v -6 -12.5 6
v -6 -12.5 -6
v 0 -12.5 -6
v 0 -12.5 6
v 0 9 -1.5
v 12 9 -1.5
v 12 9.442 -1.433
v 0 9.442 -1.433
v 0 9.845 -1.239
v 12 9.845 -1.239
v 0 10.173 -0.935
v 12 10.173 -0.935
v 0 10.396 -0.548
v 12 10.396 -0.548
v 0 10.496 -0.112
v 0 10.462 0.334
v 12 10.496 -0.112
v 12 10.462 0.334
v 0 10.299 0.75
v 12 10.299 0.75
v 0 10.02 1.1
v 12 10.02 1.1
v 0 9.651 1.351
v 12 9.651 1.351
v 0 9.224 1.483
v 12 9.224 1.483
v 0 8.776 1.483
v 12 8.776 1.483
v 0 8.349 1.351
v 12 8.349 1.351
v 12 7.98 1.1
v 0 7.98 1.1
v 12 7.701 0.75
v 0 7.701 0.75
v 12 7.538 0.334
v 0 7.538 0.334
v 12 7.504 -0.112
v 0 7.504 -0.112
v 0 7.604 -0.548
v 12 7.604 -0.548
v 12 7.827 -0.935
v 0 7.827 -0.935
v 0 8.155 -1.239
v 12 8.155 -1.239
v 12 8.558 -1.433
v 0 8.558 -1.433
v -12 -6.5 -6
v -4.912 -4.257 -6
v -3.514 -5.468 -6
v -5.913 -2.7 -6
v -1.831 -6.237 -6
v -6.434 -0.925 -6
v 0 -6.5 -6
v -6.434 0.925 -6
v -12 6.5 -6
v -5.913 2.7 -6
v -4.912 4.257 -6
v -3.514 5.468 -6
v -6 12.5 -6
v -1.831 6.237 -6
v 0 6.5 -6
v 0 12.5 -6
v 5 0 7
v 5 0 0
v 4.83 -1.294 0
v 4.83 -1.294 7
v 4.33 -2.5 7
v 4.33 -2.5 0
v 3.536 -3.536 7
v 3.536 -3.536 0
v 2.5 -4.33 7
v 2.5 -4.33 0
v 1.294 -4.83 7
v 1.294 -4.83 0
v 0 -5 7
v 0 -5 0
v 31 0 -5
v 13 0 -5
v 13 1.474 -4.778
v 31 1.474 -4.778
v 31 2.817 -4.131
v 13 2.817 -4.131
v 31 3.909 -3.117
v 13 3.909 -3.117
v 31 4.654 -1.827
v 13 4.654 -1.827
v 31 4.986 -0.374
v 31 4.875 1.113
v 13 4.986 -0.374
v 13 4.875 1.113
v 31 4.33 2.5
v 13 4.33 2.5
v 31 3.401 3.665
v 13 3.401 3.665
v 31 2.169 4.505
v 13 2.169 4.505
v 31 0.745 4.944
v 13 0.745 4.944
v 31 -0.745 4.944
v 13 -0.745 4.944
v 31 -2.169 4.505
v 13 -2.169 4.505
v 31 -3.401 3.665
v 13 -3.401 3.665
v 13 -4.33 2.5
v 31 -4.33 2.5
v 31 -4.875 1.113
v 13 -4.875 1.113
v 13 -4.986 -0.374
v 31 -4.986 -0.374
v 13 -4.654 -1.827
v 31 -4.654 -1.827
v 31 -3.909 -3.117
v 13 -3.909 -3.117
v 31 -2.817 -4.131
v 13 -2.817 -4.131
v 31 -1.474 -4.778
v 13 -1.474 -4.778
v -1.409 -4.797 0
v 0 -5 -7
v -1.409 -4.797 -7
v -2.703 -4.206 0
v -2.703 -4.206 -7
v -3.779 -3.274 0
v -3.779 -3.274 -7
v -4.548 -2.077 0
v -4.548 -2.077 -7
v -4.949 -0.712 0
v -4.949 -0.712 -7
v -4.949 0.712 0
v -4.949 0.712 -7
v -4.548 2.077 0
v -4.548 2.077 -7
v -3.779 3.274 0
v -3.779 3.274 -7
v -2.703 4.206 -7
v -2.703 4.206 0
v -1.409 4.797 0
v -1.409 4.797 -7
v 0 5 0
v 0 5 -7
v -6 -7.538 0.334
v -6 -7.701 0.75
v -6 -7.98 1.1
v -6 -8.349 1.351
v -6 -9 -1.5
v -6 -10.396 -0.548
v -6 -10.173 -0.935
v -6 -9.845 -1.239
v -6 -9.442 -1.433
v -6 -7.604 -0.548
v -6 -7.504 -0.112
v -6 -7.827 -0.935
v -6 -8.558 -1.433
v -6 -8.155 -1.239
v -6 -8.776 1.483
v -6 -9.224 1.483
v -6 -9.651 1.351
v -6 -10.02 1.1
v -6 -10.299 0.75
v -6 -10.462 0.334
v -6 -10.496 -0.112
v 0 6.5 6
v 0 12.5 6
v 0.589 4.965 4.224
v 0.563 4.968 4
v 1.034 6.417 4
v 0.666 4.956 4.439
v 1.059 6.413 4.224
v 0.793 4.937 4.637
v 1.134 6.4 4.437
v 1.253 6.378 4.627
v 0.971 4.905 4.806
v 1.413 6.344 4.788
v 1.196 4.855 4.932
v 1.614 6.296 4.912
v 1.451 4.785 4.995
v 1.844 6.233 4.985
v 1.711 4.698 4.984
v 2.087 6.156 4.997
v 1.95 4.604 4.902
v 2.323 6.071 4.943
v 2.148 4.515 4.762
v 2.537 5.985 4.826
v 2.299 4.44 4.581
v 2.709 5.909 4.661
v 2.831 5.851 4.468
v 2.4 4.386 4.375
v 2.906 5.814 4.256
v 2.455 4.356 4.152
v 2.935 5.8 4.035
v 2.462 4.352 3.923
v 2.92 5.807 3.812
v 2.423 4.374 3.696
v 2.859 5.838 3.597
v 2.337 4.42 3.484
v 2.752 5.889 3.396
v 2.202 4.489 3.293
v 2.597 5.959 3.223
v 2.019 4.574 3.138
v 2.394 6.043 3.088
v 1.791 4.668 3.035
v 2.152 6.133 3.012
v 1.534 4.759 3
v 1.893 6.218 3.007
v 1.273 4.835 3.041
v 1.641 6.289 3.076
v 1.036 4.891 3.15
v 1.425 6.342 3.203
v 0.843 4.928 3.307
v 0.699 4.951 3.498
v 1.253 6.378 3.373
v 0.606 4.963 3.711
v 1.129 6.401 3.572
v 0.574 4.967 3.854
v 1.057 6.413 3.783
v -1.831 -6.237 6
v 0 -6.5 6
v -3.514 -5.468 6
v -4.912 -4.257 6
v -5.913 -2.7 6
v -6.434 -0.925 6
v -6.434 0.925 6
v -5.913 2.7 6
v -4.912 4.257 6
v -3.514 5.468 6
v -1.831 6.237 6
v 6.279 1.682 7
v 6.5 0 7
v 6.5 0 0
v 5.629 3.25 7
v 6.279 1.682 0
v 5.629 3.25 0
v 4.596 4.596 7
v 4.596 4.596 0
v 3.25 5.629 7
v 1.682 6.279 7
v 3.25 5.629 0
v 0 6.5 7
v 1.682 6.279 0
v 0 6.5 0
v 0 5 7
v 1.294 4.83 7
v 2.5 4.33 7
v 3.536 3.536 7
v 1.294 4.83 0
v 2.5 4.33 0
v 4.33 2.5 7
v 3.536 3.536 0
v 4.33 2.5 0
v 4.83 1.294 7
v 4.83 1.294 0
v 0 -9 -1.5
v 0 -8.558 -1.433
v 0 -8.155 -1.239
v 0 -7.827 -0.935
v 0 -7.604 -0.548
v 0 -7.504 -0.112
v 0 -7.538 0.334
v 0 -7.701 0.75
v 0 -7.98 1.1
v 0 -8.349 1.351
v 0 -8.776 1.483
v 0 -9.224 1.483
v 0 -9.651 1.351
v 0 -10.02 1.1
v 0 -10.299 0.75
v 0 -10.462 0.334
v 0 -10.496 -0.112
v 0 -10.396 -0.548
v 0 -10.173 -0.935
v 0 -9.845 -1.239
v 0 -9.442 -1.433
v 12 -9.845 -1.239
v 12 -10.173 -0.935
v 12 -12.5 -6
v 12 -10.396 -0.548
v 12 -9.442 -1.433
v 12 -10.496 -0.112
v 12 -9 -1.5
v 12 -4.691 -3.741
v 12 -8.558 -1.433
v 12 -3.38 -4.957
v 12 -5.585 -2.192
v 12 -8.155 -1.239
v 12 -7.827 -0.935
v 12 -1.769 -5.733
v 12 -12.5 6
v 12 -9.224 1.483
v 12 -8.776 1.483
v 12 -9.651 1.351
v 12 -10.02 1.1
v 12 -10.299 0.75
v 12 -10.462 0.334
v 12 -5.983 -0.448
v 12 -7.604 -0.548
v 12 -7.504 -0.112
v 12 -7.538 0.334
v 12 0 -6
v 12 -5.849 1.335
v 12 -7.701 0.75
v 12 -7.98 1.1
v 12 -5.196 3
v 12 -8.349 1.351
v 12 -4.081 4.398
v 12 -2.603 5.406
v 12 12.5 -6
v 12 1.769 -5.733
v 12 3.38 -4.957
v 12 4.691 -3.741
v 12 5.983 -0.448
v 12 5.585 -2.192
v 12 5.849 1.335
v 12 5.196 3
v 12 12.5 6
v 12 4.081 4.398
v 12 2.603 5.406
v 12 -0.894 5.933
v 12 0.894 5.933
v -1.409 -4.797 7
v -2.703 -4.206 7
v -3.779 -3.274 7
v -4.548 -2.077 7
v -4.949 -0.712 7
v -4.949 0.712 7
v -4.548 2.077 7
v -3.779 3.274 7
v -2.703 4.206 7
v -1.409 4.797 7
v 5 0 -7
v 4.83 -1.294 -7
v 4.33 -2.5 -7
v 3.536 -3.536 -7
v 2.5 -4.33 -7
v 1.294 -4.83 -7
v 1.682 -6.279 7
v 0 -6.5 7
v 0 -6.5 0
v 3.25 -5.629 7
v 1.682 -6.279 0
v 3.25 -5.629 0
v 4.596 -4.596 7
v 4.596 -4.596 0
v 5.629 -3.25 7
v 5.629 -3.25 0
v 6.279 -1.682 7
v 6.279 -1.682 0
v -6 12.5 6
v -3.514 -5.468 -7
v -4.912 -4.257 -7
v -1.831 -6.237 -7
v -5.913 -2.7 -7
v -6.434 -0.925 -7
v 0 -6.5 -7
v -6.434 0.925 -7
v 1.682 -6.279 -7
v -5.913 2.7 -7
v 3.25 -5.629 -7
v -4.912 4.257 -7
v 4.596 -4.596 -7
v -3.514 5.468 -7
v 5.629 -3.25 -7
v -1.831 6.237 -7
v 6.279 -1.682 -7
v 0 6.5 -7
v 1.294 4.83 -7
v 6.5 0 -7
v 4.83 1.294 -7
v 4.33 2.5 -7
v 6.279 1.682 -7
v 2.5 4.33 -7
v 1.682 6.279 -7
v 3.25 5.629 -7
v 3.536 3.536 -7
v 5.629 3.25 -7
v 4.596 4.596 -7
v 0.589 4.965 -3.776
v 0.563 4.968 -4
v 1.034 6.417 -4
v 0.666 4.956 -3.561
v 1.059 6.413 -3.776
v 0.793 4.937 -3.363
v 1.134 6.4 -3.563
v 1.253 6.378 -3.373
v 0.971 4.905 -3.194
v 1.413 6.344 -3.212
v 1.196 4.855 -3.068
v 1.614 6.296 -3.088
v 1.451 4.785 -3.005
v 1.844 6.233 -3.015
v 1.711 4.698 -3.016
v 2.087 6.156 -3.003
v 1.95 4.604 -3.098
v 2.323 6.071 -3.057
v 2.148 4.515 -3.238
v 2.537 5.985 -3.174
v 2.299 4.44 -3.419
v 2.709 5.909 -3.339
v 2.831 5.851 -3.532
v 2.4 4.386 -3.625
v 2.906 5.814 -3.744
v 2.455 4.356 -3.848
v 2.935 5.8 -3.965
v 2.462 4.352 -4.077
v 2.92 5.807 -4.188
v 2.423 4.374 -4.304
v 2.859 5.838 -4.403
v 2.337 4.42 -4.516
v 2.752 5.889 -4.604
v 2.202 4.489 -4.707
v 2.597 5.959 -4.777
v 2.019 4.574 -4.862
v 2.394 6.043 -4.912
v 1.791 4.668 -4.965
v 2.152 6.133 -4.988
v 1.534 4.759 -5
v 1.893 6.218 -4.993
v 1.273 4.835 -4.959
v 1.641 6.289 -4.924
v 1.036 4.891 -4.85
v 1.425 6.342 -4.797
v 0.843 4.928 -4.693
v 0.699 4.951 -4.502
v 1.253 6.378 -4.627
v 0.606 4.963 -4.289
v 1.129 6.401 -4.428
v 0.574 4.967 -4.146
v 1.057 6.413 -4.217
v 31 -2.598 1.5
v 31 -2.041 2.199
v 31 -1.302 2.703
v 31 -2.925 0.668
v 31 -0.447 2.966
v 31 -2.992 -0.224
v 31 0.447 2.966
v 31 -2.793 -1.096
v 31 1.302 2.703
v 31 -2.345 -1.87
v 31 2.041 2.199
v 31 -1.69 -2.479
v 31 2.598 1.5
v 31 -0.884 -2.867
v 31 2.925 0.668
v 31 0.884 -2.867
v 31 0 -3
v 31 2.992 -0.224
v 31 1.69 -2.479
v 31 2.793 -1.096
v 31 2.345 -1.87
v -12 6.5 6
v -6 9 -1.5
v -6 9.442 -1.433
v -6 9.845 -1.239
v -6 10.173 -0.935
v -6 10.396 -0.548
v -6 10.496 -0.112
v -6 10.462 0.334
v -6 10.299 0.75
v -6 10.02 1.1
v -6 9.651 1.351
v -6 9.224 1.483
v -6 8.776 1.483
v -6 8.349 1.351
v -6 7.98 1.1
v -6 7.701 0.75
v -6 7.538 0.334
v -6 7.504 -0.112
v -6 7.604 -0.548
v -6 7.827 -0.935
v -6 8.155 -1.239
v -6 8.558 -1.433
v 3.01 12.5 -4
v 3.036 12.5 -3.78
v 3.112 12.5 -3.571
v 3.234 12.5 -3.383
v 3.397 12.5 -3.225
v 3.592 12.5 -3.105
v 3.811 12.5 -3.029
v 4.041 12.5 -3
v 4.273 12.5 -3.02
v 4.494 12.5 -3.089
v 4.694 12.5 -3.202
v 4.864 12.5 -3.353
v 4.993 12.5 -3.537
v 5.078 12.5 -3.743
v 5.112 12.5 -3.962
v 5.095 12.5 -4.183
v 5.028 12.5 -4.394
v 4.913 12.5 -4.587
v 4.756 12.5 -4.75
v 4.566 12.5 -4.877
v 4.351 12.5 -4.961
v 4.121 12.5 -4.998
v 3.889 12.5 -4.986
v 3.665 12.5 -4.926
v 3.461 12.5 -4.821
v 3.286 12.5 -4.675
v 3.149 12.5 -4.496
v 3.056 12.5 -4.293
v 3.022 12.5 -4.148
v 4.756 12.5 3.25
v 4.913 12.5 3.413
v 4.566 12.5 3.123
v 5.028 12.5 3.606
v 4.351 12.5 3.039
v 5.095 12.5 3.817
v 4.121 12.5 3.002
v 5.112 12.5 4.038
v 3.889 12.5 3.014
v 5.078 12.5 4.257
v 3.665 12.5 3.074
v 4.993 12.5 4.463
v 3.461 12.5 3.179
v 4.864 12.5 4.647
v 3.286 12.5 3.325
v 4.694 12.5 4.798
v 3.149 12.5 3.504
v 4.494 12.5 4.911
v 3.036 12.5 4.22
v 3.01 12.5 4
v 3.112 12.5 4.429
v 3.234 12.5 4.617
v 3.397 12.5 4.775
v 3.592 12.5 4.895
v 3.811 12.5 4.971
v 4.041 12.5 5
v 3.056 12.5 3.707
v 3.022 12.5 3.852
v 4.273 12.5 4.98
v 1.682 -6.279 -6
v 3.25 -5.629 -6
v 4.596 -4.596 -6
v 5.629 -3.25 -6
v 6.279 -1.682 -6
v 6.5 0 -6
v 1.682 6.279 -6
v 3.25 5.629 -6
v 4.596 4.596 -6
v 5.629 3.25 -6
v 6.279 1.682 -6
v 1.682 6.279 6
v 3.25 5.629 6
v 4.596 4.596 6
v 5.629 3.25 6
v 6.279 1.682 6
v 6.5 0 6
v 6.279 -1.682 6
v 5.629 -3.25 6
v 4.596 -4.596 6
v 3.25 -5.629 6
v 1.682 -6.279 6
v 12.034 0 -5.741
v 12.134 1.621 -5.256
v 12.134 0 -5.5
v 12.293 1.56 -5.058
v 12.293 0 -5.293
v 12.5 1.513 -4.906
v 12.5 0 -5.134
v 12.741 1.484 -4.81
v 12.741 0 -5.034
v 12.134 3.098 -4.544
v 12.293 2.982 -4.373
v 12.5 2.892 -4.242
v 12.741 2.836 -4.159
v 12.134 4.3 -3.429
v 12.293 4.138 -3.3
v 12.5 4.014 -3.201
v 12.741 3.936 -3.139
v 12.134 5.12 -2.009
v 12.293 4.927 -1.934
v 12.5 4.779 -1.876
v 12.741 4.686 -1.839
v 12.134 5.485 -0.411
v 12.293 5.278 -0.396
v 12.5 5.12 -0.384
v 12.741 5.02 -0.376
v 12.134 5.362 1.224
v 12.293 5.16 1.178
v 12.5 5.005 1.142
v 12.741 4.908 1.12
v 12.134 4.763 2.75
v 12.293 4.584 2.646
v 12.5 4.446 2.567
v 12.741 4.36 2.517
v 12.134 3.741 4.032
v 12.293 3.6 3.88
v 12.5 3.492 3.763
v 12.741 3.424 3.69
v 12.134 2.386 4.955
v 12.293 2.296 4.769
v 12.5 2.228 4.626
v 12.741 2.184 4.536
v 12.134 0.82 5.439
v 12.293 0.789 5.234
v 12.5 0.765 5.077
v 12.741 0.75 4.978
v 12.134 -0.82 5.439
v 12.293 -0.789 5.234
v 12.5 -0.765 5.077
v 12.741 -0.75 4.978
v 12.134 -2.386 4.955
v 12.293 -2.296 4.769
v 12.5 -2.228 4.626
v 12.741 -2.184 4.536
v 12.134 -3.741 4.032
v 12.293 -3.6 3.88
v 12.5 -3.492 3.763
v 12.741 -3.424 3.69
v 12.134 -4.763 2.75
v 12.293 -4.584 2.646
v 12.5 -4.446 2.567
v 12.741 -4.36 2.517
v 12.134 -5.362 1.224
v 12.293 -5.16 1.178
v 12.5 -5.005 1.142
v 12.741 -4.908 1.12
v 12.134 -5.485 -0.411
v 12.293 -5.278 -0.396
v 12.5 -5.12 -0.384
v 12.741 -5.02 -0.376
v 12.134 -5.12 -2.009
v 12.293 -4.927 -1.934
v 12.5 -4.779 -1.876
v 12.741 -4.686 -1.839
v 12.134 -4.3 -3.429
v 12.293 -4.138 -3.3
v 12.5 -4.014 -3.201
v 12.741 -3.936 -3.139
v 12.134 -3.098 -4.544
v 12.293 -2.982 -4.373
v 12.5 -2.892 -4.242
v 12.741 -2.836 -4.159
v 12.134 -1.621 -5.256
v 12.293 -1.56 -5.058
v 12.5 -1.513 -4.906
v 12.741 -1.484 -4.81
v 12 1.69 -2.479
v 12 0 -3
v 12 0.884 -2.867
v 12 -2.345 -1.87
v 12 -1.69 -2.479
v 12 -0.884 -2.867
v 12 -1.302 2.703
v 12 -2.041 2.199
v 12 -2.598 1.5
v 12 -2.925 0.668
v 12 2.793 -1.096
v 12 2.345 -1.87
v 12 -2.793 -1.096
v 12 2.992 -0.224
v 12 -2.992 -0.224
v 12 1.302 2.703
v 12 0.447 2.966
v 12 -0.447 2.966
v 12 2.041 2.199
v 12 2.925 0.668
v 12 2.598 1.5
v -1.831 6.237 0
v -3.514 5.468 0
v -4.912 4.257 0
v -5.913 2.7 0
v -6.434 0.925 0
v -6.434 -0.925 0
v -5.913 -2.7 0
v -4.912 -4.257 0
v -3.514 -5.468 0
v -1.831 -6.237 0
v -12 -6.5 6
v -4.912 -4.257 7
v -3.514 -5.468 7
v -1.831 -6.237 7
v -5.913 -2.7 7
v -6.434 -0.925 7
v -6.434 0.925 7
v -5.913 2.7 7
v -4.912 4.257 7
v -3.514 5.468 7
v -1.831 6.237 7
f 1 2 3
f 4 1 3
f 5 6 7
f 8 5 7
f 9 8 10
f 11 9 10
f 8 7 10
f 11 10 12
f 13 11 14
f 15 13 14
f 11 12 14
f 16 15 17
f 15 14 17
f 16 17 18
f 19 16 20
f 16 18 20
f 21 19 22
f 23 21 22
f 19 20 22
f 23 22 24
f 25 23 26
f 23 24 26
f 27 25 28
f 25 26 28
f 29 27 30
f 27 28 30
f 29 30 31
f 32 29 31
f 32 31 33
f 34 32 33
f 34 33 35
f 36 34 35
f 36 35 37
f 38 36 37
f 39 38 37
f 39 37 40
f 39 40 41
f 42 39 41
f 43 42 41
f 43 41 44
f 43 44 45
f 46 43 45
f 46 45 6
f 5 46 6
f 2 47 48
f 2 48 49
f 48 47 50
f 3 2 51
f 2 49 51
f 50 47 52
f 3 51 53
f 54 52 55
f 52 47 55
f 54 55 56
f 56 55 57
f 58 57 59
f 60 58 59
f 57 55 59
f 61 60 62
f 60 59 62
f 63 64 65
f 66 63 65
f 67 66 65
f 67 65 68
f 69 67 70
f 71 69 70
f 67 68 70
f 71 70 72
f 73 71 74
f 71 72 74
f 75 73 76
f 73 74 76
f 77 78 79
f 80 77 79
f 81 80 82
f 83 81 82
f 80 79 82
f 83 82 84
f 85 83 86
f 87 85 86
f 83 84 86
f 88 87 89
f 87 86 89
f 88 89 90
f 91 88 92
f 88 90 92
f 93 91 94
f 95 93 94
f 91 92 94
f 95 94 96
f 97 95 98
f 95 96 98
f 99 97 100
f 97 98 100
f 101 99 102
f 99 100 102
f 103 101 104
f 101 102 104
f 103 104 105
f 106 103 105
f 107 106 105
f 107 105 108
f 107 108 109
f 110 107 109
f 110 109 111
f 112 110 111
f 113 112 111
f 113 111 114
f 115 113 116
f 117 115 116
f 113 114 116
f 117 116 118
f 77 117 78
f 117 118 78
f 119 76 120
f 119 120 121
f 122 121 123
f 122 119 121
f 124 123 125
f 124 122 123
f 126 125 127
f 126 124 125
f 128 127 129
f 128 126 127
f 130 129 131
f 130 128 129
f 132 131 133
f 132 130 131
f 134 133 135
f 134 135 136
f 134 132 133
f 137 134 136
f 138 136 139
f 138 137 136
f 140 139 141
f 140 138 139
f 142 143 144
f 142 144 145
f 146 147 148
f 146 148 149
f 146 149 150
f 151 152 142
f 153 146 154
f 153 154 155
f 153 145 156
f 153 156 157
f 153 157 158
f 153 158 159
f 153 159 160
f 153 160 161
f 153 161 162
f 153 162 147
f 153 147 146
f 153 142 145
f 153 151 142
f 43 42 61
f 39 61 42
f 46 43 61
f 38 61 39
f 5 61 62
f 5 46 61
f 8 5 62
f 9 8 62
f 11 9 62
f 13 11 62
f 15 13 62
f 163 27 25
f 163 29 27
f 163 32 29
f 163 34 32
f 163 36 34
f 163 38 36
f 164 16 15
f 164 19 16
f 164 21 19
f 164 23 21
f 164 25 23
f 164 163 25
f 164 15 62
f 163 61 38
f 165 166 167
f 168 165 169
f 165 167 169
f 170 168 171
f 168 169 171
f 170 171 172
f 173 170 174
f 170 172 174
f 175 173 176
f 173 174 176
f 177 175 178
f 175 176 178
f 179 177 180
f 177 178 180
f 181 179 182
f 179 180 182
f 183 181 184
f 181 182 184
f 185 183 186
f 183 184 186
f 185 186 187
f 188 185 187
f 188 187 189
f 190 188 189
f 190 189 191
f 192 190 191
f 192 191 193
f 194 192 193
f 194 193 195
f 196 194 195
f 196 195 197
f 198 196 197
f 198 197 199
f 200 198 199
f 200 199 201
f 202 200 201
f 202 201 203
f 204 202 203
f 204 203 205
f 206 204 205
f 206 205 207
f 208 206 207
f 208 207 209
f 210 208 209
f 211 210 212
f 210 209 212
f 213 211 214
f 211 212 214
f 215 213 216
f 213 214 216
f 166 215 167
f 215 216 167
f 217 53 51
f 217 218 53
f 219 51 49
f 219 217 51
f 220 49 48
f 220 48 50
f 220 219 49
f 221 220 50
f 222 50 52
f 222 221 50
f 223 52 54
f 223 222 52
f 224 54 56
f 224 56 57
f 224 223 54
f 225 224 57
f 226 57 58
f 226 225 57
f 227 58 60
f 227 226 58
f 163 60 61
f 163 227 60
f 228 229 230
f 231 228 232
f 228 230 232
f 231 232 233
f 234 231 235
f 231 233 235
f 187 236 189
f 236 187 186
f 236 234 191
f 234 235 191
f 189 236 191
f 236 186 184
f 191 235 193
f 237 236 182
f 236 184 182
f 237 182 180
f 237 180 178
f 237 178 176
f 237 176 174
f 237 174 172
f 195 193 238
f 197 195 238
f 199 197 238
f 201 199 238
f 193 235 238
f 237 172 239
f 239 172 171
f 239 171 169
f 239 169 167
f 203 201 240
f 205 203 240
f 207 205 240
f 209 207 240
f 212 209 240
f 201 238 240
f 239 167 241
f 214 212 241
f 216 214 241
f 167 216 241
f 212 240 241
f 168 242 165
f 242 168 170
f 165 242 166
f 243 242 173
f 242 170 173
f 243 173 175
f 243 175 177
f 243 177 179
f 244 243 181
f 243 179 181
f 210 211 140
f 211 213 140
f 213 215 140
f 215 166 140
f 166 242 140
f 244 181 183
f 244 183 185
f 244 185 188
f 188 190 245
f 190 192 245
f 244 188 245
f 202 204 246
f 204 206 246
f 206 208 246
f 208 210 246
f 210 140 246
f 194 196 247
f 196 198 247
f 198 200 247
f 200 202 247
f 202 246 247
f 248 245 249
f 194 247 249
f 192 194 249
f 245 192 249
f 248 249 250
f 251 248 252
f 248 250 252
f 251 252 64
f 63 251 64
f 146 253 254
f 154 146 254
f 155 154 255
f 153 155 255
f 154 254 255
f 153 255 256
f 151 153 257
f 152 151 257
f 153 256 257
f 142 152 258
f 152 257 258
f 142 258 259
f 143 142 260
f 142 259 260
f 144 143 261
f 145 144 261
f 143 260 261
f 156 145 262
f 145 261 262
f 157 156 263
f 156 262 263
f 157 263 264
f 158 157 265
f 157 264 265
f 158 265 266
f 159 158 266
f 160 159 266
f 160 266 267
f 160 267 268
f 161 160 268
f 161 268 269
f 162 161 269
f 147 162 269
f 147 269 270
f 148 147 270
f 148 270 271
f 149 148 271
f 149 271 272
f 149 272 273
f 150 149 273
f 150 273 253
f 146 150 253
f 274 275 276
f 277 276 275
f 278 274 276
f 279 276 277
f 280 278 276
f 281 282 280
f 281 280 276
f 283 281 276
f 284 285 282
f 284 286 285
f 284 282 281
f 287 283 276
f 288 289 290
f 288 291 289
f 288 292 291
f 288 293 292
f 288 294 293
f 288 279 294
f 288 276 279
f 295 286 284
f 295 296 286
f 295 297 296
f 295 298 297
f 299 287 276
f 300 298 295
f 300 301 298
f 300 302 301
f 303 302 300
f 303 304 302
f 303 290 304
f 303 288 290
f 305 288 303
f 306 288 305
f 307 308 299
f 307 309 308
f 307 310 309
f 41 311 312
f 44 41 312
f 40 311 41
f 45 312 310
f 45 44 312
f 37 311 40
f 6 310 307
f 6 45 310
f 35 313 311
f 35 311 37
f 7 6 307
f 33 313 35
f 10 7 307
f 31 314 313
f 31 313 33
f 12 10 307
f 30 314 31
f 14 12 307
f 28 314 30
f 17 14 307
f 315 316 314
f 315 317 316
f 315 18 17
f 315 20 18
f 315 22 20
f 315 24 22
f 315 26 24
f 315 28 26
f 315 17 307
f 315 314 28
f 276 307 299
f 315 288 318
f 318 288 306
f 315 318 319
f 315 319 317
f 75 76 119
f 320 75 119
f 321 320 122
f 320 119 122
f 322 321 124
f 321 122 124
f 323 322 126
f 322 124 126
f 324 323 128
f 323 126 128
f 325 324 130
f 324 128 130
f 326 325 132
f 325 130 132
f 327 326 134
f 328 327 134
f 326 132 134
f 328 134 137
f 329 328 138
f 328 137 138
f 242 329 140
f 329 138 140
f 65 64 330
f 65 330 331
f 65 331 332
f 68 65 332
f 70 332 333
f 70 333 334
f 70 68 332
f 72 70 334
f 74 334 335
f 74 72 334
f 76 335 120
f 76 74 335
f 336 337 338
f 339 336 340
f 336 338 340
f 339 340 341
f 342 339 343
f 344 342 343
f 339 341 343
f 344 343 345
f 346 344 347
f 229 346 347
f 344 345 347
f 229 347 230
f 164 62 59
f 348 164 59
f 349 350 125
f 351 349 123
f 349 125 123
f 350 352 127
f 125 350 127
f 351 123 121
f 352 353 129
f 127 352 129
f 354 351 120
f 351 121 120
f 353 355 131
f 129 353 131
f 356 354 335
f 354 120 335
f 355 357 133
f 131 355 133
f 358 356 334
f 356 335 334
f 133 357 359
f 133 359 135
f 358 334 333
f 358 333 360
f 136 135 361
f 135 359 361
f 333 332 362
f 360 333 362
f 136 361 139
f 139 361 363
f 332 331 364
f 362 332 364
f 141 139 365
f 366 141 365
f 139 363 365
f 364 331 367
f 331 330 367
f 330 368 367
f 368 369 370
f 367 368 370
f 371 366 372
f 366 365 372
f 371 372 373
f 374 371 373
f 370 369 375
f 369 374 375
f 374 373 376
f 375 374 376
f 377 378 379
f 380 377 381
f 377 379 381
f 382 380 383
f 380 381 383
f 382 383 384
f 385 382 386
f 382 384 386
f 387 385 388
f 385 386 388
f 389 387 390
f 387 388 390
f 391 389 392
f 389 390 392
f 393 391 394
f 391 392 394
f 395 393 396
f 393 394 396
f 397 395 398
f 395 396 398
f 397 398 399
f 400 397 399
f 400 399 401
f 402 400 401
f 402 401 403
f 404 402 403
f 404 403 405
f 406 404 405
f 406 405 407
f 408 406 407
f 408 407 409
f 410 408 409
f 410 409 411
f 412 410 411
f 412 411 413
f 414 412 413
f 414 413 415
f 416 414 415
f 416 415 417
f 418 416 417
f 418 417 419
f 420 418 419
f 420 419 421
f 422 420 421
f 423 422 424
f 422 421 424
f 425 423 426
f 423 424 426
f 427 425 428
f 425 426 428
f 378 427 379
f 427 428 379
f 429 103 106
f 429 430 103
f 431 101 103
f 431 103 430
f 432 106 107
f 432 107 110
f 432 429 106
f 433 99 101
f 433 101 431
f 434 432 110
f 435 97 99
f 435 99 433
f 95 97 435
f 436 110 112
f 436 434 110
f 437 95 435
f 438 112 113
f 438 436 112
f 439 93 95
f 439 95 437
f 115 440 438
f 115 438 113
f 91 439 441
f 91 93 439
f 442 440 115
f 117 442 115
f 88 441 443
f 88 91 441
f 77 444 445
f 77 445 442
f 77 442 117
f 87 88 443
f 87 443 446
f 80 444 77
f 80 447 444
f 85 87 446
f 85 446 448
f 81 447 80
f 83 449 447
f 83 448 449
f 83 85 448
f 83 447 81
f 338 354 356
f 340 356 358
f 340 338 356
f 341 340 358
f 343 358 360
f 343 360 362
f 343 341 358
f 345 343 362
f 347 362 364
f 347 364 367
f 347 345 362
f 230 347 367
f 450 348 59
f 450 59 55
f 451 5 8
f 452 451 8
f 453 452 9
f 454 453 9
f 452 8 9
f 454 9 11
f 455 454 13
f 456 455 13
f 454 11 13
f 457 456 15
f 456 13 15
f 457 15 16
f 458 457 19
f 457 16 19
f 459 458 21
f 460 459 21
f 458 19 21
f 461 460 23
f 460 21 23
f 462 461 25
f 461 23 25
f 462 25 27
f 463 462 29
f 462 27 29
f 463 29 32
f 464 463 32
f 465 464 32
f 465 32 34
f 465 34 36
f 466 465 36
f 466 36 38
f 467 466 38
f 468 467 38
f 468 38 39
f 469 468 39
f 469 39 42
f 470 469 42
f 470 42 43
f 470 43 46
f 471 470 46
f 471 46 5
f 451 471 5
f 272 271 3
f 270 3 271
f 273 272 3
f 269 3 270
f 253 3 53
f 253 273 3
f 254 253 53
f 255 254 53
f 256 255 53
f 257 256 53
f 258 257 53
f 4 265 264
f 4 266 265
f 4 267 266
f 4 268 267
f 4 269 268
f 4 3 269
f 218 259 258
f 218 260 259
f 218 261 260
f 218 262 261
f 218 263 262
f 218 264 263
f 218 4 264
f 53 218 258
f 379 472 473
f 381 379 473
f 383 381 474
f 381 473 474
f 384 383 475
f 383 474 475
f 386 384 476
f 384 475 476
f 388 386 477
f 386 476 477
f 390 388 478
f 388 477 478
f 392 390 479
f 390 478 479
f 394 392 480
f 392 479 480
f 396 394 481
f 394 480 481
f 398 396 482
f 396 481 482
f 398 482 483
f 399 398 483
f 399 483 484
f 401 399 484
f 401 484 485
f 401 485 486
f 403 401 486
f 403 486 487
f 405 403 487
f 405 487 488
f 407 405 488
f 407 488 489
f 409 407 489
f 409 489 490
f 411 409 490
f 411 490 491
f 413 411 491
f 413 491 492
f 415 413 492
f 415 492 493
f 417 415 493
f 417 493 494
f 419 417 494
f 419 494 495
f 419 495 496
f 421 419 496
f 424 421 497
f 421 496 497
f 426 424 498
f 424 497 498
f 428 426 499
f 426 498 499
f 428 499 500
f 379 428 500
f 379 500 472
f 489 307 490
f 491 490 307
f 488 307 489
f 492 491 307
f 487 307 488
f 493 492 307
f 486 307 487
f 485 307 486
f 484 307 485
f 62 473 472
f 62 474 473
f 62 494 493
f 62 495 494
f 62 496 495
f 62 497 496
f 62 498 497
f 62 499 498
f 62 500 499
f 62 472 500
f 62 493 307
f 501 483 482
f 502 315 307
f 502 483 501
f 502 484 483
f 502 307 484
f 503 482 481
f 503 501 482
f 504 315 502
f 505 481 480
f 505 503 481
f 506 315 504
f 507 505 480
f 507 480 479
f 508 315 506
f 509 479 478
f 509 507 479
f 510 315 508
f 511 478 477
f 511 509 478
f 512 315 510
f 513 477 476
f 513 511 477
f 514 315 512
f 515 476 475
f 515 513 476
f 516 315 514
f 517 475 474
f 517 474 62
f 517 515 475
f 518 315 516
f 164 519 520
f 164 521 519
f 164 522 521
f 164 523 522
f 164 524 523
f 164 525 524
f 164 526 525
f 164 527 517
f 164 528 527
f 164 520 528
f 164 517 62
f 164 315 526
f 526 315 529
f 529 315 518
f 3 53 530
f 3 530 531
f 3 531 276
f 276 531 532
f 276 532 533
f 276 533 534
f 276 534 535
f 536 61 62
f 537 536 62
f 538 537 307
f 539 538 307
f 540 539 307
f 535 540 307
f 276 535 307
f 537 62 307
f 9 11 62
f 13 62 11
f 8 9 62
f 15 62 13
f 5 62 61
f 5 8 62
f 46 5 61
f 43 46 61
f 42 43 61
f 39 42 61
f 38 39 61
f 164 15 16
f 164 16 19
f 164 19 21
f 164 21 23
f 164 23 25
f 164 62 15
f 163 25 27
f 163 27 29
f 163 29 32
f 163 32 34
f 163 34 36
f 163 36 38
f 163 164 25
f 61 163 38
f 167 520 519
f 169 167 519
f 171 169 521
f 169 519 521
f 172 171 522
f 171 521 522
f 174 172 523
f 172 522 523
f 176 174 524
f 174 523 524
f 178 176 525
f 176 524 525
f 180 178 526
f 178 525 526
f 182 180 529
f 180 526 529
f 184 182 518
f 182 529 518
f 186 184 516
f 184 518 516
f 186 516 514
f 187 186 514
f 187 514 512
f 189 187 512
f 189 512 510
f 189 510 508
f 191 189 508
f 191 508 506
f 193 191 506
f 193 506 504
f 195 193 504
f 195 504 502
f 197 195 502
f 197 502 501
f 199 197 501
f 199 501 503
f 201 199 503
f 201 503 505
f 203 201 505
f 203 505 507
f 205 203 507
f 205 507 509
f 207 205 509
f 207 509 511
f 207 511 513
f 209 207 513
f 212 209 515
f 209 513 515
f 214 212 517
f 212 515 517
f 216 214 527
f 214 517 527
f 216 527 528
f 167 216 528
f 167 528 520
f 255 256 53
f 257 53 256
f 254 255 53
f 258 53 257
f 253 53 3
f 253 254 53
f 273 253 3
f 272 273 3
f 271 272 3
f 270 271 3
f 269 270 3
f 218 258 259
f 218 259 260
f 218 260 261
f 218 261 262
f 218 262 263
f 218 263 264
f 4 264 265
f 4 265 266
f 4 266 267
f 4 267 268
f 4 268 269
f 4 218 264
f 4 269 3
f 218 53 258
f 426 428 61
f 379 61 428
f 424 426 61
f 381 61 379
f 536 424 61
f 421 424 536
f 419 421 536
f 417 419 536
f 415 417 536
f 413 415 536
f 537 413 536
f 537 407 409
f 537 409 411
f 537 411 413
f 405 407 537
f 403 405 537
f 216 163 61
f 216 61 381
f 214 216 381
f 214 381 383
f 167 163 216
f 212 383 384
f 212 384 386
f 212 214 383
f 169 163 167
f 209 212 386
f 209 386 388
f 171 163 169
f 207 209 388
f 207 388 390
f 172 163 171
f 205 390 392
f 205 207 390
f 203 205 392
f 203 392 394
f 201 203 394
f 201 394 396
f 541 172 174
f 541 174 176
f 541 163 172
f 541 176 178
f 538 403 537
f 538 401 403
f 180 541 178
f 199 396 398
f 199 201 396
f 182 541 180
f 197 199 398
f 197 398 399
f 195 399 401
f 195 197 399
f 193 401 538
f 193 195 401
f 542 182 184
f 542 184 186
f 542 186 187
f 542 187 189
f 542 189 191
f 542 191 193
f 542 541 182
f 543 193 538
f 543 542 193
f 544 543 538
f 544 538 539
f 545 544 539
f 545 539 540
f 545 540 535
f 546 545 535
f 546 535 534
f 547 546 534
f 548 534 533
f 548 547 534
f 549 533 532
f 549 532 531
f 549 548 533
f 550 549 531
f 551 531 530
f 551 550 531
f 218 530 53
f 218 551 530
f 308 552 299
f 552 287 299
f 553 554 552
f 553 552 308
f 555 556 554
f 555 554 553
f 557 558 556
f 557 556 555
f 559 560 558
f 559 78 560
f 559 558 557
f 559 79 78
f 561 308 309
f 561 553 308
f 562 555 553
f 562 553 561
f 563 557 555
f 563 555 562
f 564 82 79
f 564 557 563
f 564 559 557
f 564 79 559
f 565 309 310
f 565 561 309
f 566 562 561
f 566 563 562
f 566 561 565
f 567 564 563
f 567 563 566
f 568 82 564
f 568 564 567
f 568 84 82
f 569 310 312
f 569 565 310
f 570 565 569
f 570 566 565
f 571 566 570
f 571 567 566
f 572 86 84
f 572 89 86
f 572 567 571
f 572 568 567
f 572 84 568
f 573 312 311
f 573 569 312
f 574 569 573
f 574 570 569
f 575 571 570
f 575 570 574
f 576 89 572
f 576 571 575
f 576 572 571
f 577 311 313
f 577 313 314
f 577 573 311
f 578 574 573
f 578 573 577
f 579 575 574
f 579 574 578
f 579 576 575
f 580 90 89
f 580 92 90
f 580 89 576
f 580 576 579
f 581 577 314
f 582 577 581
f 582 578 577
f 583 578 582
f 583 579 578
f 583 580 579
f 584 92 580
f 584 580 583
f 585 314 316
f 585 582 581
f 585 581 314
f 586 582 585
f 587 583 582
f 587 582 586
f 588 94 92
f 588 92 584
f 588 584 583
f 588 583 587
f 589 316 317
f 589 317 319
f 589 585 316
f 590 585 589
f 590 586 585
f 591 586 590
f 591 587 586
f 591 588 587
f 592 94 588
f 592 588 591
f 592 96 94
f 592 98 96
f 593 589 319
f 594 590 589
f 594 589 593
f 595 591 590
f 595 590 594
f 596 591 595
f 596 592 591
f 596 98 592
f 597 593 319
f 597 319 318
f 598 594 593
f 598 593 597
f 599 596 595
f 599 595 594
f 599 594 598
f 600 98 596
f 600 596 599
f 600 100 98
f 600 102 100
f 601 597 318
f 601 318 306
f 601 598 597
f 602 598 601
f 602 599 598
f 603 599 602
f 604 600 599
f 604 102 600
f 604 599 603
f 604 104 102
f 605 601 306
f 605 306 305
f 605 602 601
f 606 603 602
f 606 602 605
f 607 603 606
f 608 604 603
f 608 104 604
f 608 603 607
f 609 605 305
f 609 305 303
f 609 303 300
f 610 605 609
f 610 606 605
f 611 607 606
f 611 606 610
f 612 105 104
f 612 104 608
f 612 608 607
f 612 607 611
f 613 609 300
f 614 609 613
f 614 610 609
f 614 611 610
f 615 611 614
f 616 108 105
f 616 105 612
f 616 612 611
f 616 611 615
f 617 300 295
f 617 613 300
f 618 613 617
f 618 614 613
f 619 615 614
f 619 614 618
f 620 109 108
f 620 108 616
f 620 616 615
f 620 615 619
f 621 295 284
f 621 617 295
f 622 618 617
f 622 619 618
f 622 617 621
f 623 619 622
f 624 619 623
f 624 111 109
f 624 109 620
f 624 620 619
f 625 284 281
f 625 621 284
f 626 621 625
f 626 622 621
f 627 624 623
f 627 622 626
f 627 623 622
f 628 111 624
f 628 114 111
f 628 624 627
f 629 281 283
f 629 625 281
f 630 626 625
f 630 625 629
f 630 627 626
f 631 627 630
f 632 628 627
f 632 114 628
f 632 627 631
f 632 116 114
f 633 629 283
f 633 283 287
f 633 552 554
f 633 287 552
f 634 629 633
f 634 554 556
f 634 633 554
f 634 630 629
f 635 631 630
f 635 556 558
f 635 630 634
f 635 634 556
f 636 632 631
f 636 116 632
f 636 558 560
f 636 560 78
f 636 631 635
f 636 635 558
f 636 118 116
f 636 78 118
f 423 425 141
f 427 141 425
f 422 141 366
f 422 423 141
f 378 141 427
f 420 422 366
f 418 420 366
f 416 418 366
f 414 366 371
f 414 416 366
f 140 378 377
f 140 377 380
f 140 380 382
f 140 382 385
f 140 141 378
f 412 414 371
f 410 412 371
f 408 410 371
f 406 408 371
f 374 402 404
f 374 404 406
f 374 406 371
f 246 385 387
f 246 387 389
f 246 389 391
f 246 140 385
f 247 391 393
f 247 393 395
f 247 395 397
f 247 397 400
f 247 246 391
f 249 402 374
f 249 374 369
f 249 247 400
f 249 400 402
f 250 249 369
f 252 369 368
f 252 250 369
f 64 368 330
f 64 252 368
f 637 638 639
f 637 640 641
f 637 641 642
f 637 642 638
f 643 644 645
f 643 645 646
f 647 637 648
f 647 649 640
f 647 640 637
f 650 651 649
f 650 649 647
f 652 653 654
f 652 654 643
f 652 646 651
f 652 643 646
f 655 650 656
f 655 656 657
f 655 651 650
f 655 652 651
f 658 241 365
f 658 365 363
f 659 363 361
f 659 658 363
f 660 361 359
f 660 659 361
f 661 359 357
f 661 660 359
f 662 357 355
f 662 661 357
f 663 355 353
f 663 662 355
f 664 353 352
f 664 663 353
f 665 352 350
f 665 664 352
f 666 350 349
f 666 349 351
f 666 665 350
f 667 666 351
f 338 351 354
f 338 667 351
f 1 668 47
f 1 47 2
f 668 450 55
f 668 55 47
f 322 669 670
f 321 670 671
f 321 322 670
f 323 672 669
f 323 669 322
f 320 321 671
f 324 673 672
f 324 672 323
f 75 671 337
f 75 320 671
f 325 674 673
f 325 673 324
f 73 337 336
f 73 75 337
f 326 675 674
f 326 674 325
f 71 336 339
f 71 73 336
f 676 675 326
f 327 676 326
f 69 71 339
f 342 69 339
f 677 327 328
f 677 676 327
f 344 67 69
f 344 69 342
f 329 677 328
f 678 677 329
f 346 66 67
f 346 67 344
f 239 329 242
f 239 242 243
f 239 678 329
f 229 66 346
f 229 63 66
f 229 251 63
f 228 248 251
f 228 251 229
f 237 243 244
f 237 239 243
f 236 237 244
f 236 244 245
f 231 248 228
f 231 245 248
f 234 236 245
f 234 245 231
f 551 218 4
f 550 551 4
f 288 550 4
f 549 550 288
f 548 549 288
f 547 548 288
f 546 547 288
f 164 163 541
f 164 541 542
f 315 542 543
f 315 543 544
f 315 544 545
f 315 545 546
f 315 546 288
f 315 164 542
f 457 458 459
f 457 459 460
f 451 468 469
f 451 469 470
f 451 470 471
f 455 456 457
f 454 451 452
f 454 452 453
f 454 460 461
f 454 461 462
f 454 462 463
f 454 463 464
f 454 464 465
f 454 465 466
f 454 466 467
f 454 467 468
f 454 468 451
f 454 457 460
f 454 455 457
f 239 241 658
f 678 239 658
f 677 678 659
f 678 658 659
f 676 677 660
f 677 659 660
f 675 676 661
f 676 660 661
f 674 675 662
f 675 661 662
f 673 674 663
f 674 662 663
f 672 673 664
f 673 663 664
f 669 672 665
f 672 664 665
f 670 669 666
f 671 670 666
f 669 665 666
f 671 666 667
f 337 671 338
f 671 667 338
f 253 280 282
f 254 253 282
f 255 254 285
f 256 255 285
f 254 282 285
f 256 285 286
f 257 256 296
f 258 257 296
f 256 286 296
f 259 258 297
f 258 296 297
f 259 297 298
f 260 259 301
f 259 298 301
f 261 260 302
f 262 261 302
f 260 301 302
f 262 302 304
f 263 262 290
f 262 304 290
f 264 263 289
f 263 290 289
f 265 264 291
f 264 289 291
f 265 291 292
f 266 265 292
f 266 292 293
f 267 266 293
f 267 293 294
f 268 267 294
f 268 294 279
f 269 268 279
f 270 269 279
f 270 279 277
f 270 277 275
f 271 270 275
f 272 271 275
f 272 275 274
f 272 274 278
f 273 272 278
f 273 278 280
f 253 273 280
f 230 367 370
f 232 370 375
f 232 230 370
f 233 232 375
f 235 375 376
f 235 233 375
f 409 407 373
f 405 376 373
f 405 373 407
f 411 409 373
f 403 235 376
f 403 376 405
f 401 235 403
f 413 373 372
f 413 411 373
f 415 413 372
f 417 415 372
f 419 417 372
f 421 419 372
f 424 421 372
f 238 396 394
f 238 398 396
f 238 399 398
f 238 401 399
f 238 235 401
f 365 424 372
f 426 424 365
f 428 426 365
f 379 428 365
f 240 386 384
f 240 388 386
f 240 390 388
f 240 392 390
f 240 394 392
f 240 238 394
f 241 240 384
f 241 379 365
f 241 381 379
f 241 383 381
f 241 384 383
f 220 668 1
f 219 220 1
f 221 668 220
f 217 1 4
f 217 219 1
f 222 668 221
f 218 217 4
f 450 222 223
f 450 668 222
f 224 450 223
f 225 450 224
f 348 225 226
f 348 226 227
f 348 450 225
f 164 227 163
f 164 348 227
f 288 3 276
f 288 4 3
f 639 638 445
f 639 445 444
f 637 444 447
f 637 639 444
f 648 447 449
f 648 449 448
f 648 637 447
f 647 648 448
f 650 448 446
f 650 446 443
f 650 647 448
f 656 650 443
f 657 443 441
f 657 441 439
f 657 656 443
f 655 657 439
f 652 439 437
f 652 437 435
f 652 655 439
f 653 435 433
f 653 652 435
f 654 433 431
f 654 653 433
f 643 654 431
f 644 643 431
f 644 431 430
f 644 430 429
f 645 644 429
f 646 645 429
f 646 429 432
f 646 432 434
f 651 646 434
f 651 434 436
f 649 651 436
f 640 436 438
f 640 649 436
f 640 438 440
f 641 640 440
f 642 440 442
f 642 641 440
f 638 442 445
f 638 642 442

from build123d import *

# Parameters (mm, degrees)
BOSS_EXTRUDE1_DEPTH     = 6
BOSS_EXTRUDE2_DEPTH     = 6
SKETCH2_R               = 5
SKETCH2_R_2             = 3
BOSS_EXTRUDE3_DEPTH     = 19
SKETCH2_3_R             = 1.5
CUT_EXTRUDE1_DEPTH      = 18
BOSS_EXTRUDE4_DEPTH     = 7
CUT_EXTRUDE2_REACH      = 40.49
CUT_EXTRUDE2_END_RADIUS = 5
SKETCH3_R               = 1
FILLET1_R               = 1


with BuildPart() as part:
    # Sketch1 → Boss-Extrude1 (new, symmetric)
    with BuildSketch(Plane.XY):
        with BuildLine():
            Line((12, 12.5), (0, 12.5))
            Line((0, 12.5), (0, 6.5))
            ThreePointArc((0, 6.5), (4.596194078, 4.596194078), (6.5, 0))
            ThreePointArc((6.5, 0), (4.596194078, -4.596194078), (0, -6.5))
            Line((0, -6.5), (0, -12.5))
            Line((0, -12.5), (12, -12.5))
            Line((12, -12.5), (12, 12.5))
        make_face()
    extrude(amount=BOSS_EXTRUDE1_DEPTH, both=True)

    # Sketch2 → Boss-Extrude3 (add)
    with BuildSketch(Plane(origin=(12, 0, 0), x_dir=(0, 0, -1), z_dir=(1, 0, 0))):
        Circle(SKETCH2_R)
        Circle(SKETCH2_R_2, mode=Mode.SUBTRACT)
    extrude(amount=BOSS_EXTRUDE3_DEPTH)


with BuildPart() as body_2:
    # Sketch1<3> → Boss-Extrude2 (new, symmetric)
    with BuildSketch(Plane.XY):
        with BuildLine():
            Line((0, 6.5), (0, 12.5))
            Line((0, 12.5), (-6, 12.5))
            Line((-6, 12.5), (-12, 6.5))
            Line((-12, 6.5), (-12, -6.5))
            Line((-12, -6.5), (-6, -12.5))
            Line((-6, -12.5), (0, -12.5))
            Line((0, -12.5), (0, -6.5))
            ThreePointArc((0, -6.5), (-6.5, 0), (0, 6.5))
        make_face()
    extrude(amount=BOSS_EXTRUDE2_DEPTH, both=True)


with BuildPart() as cut_extrude1_tool:
    # Sketch2<3> → Cut-Extrude1 (new body)
    with BuildSketch(Plane(origin=(12, 0, 0), x_dir=(0, 0, -1), z_dir=(1, 0, 0))):
        with Locations((0, 9)):
            Circle(SKETCH2_3_R)
        with Locations((0, -9)):
            Circle(SKETCH2_3_R)
    extrude(amount=-CUT_EXTRUDE1_DEPTH)


with BuildPart() as part_1:
    add(part.part)

    # Cut-Extrude1: cut by cut_extrude1_tool
    add(cut_extrude1_tool.part, mode=Mode.SUBTRACT)


with BuildPart() as body_2_1:
    add(body_2.part)

    # Cut-Extrude1: cut by cut_extrude1_tool
    add(cut_extrude1_tool.part, mode=Mode.SUBTRACT)


with BuildPart() as body_3:
    # Sketch1<4> → Boss-Extrude4 (new, symmetric)
    with BuildSketch(Plane.XY):
        with BuildLine():
            ThreePointArc((6.5, 0), (4.596194078, 4.596194078), (0, 6.5))
            Line((0, 6.5), (0, 5))
            ThreePointArc((0, 5), (3.535533906, 3.535533906), (5, 0))
            ThreePointArc((5, 0), (3.535533906, -3.535533906), (0, -5))
            Line((0, -5), (0, -6.5))
            ThreePointArc((0, -6.5), (4.596194078, -4.596194078), (6.5, 0))
        make_face()
        with BuildLine():
            Line((0, 5), (0, 6.5))
            ThreePointArc((0, 6.5), (-6.5, 0), (0, -6.5))
            Line((0, -6.5), (0, -5))
            ThreePointArc((0, -5), (-5, 0), (0, 5))
        make_face()
    extrude(amount=BOSS_EXTRUDE4_DEPTH, both=True)


with BuildPart() as cut_extrude2_tool:
    # Cut-Extrude2: up to this cylinder (the profile starts outside it)
    cut_extrude2_end = Plane(origin=(0, 0, 0), z_dir=(0, 0, -1)) * Cylinder(CUT_EXTRUDE2_END_RADIUS, 99.98, mode=Mode.PRIVATE)
    # Sketch3 → Cut-Extrude2 (new, up to the surface)
    with BuildSketch(Plane(origin=(4.819555861, 14.833067729, 0), x_dir=(0, 0, -1), z_dir=(0.3090169943749482, 0.9510565162951534, 0)), mode=Mode.PRIVATE) as cut_extrude2_sk1:
        with Locations(Location((-4, 0, 0), (0, 0, 90))):
            Circle(SKETCH3_R)
    cut_extrude2_tool1 = extrude(cut_extrude2_sk1.sketch, amount=-CUT_EXTRUDE2_REACH, mode=Mode.PRIVATE) - cut_extrude2_end
    add(cut_extrude2_tool1.solids().sort_by_distance((4.819556, 14.833068, 4))[0])
    # Sketch3 → Cut-Extrude2 (new, up to the surface)
    with BuildSketch(Plane(origin=(4.819555861, 14.833067729, 0), x_dir=(0, 0, -1), z_dir=(0.3090169943749482, 0.9510565162951534, 0)), mode=Mode.PRIVATE) as cut_extrude2_sk2:
        with Locations(Location((4, 0, 0), (0, 0, 90))):
            Circle(SKETCH3_R)
    cut_extrude2_tool2 = extrude(cut_extrude2_sk2.sketch, amount=-CUT_EXTRUDE2_REACH, mode=Mode.PRIVATE) - cut_extrude2_end
    add(cut_extrude2_tool2.solids().sort_by_distance((4.819556, 14.833068, -4))[0])


with BuildPart() as part_2:
    add(part_1.part)

    # Cut-Extrude2: cut by cut_extrude2_tool
    add(cut_extrude2_tool.part, mode=Mode.SUBTRACT)

    # Fillet1
    fillet1_edges = [part_2.edges().sort_by_distance(p)[0] for p in [
        (12, 0, 5),
    ]]
    fillet(fillet1_edges, radius=FILLET1_R - 0.0001)  # a hair under: the kernel refuses the full size


with BuildPart() as body_3_1:
    add(body_3.part)

    # Cut-Extrude2: cut by cut_extrude2_tool
    add(cut_extrude2_tool.part, mode=Mode.SUBTRACT)


solid = Compound([body_2_1.part, part_2.part, body_3_1.part])
